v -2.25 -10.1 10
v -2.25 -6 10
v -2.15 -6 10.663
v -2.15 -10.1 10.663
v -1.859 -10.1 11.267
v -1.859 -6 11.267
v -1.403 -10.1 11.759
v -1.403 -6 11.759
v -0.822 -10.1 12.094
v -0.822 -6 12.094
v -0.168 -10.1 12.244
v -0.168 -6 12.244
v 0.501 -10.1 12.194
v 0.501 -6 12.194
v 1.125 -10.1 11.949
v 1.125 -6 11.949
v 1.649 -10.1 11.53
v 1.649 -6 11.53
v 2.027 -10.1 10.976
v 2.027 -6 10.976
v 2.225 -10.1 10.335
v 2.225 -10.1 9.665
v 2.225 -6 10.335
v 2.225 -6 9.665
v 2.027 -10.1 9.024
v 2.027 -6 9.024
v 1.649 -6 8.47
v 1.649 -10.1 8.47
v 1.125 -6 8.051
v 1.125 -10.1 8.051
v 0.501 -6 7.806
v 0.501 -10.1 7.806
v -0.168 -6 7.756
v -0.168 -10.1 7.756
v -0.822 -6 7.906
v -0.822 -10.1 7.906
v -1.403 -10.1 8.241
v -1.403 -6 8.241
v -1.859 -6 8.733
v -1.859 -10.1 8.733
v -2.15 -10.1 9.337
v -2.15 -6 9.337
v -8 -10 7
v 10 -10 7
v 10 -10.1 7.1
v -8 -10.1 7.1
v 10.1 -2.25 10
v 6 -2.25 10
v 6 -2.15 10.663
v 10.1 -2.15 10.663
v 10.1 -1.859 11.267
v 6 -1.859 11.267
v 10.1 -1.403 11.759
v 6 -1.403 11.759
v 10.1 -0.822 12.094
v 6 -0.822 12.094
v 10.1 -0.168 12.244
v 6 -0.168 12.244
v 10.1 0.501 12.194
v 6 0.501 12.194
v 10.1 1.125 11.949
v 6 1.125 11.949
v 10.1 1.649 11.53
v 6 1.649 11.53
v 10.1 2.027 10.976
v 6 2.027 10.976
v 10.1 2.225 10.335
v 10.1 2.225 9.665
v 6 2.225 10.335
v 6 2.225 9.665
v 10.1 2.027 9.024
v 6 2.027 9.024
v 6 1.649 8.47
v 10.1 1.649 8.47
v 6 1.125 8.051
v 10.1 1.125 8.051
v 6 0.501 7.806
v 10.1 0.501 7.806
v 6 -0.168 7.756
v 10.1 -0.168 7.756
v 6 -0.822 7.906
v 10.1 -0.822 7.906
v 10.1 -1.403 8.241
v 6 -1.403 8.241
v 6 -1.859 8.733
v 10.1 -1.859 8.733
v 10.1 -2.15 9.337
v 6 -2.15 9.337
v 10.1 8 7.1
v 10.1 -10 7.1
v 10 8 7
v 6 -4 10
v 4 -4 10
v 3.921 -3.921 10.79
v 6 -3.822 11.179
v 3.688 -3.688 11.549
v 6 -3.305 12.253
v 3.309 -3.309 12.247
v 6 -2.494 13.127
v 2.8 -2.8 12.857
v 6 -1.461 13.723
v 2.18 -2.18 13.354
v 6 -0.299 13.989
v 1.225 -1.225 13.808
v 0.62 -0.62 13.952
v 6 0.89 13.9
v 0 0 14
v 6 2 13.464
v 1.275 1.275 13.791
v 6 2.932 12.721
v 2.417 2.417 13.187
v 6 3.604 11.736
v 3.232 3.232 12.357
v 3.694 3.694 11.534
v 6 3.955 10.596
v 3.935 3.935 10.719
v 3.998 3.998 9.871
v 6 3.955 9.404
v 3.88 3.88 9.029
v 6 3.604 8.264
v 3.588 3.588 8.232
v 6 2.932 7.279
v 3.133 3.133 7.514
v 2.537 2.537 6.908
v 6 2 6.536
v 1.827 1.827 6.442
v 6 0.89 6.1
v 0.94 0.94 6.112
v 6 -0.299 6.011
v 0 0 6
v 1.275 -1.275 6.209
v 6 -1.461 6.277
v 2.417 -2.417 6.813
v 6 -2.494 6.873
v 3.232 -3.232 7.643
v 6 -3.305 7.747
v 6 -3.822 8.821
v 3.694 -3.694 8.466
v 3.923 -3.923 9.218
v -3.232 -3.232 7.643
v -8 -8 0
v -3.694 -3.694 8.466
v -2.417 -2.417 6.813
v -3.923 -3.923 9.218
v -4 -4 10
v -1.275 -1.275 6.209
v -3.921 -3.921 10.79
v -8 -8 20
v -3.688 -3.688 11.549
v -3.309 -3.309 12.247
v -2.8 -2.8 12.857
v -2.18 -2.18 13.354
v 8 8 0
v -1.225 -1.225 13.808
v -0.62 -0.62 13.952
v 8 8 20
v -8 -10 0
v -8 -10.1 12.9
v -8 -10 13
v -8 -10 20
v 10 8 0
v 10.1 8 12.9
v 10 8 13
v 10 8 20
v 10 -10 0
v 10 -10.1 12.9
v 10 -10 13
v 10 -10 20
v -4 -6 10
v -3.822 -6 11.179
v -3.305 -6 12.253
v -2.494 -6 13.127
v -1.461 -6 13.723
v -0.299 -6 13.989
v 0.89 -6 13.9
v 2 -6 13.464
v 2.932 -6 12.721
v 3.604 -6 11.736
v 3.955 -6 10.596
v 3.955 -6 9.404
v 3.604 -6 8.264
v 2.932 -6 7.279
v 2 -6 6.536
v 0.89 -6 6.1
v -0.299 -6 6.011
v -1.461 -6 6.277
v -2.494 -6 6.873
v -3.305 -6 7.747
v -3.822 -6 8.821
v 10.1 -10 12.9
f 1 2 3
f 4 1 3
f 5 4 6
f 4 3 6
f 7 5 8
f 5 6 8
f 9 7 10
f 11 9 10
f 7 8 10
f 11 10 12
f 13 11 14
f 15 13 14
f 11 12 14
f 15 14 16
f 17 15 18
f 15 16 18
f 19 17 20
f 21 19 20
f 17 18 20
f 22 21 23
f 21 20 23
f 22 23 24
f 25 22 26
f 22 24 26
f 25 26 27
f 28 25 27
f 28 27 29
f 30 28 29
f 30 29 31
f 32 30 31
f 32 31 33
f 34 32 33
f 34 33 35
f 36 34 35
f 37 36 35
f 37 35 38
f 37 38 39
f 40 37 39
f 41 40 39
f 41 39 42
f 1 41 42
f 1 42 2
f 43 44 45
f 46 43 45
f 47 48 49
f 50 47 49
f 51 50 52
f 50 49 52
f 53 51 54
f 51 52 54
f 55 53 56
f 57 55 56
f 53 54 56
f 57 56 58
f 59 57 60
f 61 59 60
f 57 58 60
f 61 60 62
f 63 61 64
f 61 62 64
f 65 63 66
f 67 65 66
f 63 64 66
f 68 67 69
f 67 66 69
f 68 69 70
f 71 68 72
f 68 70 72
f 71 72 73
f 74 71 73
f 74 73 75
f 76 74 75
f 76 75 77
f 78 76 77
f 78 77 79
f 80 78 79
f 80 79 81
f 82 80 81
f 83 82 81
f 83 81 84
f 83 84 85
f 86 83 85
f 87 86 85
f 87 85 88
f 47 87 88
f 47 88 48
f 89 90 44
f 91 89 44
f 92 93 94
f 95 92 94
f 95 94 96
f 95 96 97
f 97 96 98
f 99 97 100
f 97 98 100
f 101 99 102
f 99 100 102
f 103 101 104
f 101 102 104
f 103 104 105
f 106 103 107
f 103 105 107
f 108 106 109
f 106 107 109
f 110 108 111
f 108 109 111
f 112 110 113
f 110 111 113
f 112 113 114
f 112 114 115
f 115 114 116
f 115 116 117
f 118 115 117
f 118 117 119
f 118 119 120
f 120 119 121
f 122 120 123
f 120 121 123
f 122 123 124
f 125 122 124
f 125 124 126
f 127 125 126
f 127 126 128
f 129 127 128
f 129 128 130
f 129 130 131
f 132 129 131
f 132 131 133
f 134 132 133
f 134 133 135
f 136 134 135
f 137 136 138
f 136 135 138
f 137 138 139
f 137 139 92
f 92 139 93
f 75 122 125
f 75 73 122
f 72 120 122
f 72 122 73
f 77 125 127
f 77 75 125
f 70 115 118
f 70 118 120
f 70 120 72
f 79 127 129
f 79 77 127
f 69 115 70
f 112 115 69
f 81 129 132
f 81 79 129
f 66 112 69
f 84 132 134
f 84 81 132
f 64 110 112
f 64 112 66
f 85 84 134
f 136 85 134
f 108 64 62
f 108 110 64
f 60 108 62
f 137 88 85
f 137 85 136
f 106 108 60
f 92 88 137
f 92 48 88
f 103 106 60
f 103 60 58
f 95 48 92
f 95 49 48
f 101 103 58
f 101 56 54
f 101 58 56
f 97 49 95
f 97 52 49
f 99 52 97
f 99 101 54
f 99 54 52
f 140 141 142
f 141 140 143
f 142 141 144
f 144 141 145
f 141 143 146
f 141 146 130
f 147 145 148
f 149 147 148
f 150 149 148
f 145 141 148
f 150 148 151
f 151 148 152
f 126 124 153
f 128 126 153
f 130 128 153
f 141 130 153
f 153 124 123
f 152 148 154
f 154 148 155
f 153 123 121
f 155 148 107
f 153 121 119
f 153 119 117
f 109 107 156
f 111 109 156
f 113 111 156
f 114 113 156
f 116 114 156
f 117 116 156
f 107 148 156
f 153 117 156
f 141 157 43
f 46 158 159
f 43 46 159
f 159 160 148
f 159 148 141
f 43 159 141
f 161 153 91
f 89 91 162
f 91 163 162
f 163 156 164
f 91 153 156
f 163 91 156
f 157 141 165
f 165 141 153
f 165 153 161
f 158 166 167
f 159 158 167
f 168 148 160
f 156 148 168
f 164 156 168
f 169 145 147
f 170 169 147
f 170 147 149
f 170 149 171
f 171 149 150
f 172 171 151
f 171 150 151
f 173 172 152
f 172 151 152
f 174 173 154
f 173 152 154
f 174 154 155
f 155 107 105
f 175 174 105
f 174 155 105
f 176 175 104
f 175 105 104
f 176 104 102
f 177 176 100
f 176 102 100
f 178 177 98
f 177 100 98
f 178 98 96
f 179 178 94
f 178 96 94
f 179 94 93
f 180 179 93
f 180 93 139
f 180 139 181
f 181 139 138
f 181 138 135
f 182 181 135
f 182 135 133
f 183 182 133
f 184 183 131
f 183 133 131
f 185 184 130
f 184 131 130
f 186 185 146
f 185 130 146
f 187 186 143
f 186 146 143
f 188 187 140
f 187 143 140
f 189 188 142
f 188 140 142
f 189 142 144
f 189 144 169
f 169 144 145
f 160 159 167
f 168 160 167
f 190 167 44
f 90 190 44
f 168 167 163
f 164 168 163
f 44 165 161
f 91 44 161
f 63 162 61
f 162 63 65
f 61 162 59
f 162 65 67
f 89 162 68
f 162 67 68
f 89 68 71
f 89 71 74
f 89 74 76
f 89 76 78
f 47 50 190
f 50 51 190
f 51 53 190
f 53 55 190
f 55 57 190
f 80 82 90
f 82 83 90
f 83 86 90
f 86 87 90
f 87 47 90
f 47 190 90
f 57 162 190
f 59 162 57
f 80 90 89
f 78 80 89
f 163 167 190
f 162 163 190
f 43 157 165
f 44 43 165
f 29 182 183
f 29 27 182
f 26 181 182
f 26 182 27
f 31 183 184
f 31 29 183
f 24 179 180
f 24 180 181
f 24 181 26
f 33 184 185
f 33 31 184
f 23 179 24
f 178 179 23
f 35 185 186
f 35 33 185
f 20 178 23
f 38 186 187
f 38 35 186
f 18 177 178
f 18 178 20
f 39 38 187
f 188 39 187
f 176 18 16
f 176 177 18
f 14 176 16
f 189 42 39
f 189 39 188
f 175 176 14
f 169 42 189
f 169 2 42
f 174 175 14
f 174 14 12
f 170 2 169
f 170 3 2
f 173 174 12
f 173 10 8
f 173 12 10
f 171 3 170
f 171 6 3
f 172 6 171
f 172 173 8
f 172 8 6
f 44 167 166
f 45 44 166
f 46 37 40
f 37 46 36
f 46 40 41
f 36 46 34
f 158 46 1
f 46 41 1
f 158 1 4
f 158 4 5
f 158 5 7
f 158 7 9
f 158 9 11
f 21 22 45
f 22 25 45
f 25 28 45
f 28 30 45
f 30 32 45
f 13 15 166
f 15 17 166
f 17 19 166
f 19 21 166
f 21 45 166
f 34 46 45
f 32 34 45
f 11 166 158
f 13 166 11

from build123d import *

# Parameters (mm, degrees)
SKETCH_W        = 20
SKETCH_H        = 20
PAD_DEPTH       = 20
PAD001_DEPTH    = 20
PAD002_DEPTH    = 20
SKETCH004_R     = 2.25
POCKET001_DEPTH = 20.1
SKETCH005_R     = 4
POCKET002_DEPTH = 16
SKETCH006_R     = 2.25
POCKET003_DEPTH = 20.1
SKETCH007_R     = 4
POCKET004_DEPTH = 16
POCKET_DEPTH    = 20


with BuildPart() as part:
    # Sketch → Pad (new body)
    with BuildSketch(Plane.XY):
        Rectangle(SKETCH_W, SKETCH_H)
    extrude(amount=PAD_DEPTH)

    # Sketch001 (on DatumPlane) → Pad001 (join)
    with BuildSketch(Plane.XZ.offset(10)):
        Polygon((10, 13), (10.1, 12.9), (10.1, 7.1), (10, 7), align=None)
    extrude(amount=-PAD001_DEPTH)

    # Sketch002 (on DatumPlane) → Pad002 (join)
    with BuildSketch(Plane.YZ.offset(10)):
        Polygon((-10, 13), (-10, 7), (-10.1, 7.1), (-10.1, 12.9), align=None)
    extrude(amount=-PAD002_DEPTH)

    # Sketch004 (on DatumPlane) → Pocket001 (cut)
    with BuildSketch(Plane(origin=(-10, 0, 0), x_dir=(0, -1, 0), z_dir=(-1, 0, 0))):
        with Locations((20, 10)):
            Circle(SKETCH004_R)
        with Locations((0, 10)):
            Circle(SKETCH004_R)
    extrude(amount=-POCKET001_DEPTH, mode=Mode.SUBTRACT)

    # Sketch005 (on DatumPlane) → Pocket002 (cut)
    with BuildSketch(Plane(origin=(-10, 0, 0), x_dir=(0, -1, 0), z_dir=(-1, 0, 0))):
        with Locations((20, 10)):
            Circle(SKETCH005_R)
        with Locations((0, 10)):
            Circle(SKETCH005_R)
    extrude(amount=-POCKET002_DEPTH, mode=Mode.SUBTRACT)

    # Sketch006 (on DatumPlane) → Pocket003 (cut)
    with BuildSketch(Plane(origin=(0, 10, 0), x_dir=(-1, 0, 0), z_dir=(0, 1, 0))):
        with Locations((0, 10)):
            Circle(SKETCH006_R)
        with Locations((20, 10)):
            Circle(SKETCH006_R)
    extrude(amount=-POCKET003_DEPTH, mode=Mode.SUBTRACT)

    # Sketch007 (on DatumPlane) → Pocket004 (cut)
    with BuildSketch(Plane(origin=(0, 10, 0), x_dir=(-1, 0, 0), z_dir=(0, 1, 0))):
        with Locations((0, 10)):
            Circle(SKETCH007_R)
        with Locations((20, 10)):
            Circle(SKETCH007_R)
    extrude(amount=-POCKET004_DEPTH, mode=Mode.SUBTRACT)

    # Sketch008 (on DatumPlane) → Pocket (cut)
    with BuildSketch(Plane.XY.offset(20)):
        Polygon((10.1, 10.1), (-10.1, 10.1), (-10.1, -10.1), (-8, -10.1), (-8, -8), (8, 8), (10.1, 8), align=None)
    extrude(amount=-POCKET_DEPTH, mode=Mode.SUBTRACT)


solid = part.part
